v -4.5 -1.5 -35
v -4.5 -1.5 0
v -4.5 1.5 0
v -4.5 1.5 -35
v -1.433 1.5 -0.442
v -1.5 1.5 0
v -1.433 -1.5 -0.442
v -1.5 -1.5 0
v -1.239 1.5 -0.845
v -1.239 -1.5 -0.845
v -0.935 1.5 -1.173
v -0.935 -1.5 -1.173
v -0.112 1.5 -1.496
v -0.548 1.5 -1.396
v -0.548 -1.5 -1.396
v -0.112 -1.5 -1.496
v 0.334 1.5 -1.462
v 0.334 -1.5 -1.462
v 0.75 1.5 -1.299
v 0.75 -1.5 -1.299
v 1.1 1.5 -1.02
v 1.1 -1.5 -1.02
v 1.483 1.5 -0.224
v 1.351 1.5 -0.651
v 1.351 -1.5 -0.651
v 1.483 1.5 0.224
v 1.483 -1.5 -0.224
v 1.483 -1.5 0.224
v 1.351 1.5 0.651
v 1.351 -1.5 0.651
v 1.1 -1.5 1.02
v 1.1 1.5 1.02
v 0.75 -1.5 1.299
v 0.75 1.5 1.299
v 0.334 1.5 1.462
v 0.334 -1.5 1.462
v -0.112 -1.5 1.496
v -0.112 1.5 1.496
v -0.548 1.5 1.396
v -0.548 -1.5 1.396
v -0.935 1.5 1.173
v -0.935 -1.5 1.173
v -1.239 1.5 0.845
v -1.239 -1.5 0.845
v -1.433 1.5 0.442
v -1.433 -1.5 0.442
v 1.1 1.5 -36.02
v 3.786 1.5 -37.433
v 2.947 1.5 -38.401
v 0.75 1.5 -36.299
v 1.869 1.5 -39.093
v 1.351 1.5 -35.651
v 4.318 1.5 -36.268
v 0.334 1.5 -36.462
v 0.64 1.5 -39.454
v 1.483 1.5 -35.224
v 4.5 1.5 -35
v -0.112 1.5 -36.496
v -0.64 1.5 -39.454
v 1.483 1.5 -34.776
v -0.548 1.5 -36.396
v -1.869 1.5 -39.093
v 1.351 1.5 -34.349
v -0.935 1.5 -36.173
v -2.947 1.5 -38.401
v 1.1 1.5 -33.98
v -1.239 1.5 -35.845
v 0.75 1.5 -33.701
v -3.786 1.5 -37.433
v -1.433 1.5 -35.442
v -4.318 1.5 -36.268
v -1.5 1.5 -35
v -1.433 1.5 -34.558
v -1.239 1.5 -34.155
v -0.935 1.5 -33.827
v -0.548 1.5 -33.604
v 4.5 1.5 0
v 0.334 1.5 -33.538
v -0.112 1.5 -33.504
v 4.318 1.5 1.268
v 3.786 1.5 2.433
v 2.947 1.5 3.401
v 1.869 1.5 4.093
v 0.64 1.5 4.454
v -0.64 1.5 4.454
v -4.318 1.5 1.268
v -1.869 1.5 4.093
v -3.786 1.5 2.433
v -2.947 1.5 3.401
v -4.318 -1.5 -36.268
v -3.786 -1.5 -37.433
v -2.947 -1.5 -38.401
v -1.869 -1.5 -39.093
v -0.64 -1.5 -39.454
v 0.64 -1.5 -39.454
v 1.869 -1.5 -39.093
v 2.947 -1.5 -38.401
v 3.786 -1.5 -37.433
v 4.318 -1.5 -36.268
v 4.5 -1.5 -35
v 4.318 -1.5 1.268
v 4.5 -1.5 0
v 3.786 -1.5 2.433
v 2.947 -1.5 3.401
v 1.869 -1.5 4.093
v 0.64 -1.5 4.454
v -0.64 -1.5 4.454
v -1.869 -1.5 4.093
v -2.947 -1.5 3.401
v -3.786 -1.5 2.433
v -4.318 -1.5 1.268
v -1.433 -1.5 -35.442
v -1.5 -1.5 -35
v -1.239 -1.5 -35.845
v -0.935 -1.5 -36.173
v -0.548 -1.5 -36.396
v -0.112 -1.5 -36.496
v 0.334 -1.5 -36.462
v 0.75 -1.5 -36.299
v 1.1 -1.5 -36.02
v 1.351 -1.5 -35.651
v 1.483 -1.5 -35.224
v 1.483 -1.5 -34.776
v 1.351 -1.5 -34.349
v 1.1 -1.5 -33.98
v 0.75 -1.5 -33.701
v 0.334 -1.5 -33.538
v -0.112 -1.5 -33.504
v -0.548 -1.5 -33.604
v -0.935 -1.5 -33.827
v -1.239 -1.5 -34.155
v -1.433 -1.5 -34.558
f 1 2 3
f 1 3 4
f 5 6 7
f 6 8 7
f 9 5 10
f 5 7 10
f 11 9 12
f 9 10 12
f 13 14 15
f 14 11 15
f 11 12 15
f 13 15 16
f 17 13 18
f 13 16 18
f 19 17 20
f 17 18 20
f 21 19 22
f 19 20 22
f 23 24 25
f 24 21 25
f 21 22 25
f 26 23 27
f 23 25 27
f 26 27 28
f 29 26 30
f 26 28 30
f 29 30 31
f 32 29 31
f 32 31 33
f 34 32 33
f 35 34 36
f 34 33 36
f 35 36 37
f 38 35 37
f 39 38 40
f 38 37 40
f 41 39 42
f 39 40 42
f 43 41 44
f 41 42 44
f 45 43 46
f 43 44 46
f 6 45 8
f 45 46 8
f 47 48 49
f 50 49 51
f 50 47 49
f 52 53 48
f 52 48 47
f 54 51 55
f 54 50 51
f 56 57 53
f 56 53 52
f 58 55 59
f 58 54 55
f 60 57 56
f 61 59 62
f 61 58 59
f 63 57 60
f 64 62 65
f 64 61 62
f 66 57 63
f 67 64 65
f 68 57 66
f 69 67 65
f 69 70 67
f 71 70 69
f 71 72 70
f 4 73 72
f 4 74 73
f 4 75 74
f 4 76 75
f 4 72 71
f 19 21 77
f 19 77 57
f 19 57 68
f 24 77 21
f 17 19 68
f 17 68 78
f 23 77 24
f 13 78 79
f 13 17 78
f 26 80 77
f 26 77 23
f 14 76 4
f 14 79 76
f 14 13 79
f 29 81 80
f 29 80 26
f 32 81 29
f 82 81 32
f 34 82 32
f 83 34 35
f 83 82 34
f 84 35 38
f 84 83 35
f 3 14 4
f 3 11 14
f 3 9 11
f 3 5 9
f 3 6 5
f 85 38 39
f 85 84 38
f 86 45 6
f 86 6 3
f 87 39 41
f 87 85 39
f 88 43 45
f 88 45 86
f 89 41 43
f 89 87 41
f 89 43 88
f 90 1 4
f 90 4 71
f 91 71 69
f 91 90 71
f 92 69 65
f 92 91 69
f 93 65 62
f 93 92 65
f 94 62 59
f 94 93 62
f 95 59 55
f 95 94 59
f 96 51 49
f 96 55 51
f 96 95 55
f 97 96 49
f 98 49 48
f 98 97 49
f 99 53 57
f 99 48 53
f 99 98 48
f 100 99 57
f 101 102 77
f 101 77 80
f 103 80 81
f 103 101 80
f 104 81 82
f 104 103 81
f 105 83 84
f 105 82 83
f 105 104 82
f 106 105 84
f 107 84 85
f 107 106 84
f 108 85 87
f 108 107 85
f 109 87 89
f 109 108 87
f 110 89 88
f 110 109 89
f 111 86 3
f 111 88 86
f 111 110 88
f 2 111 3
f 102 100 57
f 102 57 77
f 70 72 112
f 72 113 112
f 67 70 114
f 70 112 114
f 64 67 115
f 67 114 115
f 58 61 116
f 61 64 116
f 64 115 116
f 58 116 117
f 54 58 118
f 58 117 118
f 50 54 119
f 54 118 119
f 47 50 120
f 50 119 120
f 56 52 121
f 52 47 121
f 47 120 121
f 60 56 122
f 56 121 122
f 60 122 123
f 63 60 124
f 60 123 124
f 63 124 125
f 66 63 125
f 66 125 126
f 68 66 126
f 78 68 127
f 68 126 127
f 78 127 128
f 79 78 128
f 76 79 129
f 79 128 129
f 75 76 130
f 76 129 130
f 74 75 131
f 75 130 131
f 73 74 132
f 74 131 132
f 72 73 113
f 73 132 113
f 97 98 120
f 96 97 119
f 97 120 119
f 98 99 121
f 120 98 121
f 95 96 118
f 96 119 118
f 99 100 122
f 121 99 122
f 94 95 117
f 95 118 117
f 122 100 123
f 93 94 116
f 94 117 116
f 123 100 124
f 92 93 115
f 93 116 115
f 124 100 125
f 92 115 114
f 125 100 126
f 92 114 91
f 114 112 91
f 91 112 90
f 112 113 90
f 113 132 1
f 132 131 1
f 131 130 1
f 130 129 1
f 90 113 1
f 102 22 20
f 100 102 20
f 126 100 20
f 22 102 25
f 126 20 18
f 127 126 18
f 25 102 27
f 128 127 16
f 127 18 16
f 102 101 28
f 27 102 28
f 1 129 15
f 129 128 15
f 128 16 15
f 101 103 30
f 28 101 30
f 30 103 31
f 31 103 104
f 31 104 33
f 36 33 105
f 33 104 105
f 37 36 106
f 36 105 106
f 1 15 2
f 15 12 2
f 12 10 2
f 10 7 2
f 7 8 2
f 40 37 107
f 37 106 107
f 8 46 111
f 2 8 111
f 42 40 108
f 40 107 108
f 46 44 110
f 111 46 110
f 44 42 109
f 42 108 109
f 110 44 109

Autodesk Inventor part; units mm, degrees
ref_plane "YZ Plane" through (0, 0, 0) normal (1, 0, 0) x (0, 1, 0)
ref_plane "XZ Plane" through (0, 0, 0) normal (0, 1, 0) x (-1, 0, 0)
ref_plane "XY Plane" through (0, 0, 0) normal (0, 0, 1) x (1, 0, 0)
sketch "Sketch1" plane through (0, 0, 0) normal (0, 1, 0) x (-1, 0, 0)
  circle A0 centre (0, 0) radius 1.5
  line L0 (0, 0) -> (0, -35) construction
  circle A1 centre (0, -35) radius 1.5
  circle A2 centre (0, 0) radius 4.5
  circle A3 centre (0, -35) radius 4.5
  line L1 (4.5, 0) -> (4.5, -35)
  line L2 (-4.5, -35) -> (-4.5, 0)
  dimension "d0" = 3
  dimension "d1" = 3
  dimension "d2" = 3
  dimension "d3" = 3
  dimension "d4" = 35
extrude "Extrusion1" add sketch "Sketch1" along normal mid plane 3
properties part number "barras_micro"
